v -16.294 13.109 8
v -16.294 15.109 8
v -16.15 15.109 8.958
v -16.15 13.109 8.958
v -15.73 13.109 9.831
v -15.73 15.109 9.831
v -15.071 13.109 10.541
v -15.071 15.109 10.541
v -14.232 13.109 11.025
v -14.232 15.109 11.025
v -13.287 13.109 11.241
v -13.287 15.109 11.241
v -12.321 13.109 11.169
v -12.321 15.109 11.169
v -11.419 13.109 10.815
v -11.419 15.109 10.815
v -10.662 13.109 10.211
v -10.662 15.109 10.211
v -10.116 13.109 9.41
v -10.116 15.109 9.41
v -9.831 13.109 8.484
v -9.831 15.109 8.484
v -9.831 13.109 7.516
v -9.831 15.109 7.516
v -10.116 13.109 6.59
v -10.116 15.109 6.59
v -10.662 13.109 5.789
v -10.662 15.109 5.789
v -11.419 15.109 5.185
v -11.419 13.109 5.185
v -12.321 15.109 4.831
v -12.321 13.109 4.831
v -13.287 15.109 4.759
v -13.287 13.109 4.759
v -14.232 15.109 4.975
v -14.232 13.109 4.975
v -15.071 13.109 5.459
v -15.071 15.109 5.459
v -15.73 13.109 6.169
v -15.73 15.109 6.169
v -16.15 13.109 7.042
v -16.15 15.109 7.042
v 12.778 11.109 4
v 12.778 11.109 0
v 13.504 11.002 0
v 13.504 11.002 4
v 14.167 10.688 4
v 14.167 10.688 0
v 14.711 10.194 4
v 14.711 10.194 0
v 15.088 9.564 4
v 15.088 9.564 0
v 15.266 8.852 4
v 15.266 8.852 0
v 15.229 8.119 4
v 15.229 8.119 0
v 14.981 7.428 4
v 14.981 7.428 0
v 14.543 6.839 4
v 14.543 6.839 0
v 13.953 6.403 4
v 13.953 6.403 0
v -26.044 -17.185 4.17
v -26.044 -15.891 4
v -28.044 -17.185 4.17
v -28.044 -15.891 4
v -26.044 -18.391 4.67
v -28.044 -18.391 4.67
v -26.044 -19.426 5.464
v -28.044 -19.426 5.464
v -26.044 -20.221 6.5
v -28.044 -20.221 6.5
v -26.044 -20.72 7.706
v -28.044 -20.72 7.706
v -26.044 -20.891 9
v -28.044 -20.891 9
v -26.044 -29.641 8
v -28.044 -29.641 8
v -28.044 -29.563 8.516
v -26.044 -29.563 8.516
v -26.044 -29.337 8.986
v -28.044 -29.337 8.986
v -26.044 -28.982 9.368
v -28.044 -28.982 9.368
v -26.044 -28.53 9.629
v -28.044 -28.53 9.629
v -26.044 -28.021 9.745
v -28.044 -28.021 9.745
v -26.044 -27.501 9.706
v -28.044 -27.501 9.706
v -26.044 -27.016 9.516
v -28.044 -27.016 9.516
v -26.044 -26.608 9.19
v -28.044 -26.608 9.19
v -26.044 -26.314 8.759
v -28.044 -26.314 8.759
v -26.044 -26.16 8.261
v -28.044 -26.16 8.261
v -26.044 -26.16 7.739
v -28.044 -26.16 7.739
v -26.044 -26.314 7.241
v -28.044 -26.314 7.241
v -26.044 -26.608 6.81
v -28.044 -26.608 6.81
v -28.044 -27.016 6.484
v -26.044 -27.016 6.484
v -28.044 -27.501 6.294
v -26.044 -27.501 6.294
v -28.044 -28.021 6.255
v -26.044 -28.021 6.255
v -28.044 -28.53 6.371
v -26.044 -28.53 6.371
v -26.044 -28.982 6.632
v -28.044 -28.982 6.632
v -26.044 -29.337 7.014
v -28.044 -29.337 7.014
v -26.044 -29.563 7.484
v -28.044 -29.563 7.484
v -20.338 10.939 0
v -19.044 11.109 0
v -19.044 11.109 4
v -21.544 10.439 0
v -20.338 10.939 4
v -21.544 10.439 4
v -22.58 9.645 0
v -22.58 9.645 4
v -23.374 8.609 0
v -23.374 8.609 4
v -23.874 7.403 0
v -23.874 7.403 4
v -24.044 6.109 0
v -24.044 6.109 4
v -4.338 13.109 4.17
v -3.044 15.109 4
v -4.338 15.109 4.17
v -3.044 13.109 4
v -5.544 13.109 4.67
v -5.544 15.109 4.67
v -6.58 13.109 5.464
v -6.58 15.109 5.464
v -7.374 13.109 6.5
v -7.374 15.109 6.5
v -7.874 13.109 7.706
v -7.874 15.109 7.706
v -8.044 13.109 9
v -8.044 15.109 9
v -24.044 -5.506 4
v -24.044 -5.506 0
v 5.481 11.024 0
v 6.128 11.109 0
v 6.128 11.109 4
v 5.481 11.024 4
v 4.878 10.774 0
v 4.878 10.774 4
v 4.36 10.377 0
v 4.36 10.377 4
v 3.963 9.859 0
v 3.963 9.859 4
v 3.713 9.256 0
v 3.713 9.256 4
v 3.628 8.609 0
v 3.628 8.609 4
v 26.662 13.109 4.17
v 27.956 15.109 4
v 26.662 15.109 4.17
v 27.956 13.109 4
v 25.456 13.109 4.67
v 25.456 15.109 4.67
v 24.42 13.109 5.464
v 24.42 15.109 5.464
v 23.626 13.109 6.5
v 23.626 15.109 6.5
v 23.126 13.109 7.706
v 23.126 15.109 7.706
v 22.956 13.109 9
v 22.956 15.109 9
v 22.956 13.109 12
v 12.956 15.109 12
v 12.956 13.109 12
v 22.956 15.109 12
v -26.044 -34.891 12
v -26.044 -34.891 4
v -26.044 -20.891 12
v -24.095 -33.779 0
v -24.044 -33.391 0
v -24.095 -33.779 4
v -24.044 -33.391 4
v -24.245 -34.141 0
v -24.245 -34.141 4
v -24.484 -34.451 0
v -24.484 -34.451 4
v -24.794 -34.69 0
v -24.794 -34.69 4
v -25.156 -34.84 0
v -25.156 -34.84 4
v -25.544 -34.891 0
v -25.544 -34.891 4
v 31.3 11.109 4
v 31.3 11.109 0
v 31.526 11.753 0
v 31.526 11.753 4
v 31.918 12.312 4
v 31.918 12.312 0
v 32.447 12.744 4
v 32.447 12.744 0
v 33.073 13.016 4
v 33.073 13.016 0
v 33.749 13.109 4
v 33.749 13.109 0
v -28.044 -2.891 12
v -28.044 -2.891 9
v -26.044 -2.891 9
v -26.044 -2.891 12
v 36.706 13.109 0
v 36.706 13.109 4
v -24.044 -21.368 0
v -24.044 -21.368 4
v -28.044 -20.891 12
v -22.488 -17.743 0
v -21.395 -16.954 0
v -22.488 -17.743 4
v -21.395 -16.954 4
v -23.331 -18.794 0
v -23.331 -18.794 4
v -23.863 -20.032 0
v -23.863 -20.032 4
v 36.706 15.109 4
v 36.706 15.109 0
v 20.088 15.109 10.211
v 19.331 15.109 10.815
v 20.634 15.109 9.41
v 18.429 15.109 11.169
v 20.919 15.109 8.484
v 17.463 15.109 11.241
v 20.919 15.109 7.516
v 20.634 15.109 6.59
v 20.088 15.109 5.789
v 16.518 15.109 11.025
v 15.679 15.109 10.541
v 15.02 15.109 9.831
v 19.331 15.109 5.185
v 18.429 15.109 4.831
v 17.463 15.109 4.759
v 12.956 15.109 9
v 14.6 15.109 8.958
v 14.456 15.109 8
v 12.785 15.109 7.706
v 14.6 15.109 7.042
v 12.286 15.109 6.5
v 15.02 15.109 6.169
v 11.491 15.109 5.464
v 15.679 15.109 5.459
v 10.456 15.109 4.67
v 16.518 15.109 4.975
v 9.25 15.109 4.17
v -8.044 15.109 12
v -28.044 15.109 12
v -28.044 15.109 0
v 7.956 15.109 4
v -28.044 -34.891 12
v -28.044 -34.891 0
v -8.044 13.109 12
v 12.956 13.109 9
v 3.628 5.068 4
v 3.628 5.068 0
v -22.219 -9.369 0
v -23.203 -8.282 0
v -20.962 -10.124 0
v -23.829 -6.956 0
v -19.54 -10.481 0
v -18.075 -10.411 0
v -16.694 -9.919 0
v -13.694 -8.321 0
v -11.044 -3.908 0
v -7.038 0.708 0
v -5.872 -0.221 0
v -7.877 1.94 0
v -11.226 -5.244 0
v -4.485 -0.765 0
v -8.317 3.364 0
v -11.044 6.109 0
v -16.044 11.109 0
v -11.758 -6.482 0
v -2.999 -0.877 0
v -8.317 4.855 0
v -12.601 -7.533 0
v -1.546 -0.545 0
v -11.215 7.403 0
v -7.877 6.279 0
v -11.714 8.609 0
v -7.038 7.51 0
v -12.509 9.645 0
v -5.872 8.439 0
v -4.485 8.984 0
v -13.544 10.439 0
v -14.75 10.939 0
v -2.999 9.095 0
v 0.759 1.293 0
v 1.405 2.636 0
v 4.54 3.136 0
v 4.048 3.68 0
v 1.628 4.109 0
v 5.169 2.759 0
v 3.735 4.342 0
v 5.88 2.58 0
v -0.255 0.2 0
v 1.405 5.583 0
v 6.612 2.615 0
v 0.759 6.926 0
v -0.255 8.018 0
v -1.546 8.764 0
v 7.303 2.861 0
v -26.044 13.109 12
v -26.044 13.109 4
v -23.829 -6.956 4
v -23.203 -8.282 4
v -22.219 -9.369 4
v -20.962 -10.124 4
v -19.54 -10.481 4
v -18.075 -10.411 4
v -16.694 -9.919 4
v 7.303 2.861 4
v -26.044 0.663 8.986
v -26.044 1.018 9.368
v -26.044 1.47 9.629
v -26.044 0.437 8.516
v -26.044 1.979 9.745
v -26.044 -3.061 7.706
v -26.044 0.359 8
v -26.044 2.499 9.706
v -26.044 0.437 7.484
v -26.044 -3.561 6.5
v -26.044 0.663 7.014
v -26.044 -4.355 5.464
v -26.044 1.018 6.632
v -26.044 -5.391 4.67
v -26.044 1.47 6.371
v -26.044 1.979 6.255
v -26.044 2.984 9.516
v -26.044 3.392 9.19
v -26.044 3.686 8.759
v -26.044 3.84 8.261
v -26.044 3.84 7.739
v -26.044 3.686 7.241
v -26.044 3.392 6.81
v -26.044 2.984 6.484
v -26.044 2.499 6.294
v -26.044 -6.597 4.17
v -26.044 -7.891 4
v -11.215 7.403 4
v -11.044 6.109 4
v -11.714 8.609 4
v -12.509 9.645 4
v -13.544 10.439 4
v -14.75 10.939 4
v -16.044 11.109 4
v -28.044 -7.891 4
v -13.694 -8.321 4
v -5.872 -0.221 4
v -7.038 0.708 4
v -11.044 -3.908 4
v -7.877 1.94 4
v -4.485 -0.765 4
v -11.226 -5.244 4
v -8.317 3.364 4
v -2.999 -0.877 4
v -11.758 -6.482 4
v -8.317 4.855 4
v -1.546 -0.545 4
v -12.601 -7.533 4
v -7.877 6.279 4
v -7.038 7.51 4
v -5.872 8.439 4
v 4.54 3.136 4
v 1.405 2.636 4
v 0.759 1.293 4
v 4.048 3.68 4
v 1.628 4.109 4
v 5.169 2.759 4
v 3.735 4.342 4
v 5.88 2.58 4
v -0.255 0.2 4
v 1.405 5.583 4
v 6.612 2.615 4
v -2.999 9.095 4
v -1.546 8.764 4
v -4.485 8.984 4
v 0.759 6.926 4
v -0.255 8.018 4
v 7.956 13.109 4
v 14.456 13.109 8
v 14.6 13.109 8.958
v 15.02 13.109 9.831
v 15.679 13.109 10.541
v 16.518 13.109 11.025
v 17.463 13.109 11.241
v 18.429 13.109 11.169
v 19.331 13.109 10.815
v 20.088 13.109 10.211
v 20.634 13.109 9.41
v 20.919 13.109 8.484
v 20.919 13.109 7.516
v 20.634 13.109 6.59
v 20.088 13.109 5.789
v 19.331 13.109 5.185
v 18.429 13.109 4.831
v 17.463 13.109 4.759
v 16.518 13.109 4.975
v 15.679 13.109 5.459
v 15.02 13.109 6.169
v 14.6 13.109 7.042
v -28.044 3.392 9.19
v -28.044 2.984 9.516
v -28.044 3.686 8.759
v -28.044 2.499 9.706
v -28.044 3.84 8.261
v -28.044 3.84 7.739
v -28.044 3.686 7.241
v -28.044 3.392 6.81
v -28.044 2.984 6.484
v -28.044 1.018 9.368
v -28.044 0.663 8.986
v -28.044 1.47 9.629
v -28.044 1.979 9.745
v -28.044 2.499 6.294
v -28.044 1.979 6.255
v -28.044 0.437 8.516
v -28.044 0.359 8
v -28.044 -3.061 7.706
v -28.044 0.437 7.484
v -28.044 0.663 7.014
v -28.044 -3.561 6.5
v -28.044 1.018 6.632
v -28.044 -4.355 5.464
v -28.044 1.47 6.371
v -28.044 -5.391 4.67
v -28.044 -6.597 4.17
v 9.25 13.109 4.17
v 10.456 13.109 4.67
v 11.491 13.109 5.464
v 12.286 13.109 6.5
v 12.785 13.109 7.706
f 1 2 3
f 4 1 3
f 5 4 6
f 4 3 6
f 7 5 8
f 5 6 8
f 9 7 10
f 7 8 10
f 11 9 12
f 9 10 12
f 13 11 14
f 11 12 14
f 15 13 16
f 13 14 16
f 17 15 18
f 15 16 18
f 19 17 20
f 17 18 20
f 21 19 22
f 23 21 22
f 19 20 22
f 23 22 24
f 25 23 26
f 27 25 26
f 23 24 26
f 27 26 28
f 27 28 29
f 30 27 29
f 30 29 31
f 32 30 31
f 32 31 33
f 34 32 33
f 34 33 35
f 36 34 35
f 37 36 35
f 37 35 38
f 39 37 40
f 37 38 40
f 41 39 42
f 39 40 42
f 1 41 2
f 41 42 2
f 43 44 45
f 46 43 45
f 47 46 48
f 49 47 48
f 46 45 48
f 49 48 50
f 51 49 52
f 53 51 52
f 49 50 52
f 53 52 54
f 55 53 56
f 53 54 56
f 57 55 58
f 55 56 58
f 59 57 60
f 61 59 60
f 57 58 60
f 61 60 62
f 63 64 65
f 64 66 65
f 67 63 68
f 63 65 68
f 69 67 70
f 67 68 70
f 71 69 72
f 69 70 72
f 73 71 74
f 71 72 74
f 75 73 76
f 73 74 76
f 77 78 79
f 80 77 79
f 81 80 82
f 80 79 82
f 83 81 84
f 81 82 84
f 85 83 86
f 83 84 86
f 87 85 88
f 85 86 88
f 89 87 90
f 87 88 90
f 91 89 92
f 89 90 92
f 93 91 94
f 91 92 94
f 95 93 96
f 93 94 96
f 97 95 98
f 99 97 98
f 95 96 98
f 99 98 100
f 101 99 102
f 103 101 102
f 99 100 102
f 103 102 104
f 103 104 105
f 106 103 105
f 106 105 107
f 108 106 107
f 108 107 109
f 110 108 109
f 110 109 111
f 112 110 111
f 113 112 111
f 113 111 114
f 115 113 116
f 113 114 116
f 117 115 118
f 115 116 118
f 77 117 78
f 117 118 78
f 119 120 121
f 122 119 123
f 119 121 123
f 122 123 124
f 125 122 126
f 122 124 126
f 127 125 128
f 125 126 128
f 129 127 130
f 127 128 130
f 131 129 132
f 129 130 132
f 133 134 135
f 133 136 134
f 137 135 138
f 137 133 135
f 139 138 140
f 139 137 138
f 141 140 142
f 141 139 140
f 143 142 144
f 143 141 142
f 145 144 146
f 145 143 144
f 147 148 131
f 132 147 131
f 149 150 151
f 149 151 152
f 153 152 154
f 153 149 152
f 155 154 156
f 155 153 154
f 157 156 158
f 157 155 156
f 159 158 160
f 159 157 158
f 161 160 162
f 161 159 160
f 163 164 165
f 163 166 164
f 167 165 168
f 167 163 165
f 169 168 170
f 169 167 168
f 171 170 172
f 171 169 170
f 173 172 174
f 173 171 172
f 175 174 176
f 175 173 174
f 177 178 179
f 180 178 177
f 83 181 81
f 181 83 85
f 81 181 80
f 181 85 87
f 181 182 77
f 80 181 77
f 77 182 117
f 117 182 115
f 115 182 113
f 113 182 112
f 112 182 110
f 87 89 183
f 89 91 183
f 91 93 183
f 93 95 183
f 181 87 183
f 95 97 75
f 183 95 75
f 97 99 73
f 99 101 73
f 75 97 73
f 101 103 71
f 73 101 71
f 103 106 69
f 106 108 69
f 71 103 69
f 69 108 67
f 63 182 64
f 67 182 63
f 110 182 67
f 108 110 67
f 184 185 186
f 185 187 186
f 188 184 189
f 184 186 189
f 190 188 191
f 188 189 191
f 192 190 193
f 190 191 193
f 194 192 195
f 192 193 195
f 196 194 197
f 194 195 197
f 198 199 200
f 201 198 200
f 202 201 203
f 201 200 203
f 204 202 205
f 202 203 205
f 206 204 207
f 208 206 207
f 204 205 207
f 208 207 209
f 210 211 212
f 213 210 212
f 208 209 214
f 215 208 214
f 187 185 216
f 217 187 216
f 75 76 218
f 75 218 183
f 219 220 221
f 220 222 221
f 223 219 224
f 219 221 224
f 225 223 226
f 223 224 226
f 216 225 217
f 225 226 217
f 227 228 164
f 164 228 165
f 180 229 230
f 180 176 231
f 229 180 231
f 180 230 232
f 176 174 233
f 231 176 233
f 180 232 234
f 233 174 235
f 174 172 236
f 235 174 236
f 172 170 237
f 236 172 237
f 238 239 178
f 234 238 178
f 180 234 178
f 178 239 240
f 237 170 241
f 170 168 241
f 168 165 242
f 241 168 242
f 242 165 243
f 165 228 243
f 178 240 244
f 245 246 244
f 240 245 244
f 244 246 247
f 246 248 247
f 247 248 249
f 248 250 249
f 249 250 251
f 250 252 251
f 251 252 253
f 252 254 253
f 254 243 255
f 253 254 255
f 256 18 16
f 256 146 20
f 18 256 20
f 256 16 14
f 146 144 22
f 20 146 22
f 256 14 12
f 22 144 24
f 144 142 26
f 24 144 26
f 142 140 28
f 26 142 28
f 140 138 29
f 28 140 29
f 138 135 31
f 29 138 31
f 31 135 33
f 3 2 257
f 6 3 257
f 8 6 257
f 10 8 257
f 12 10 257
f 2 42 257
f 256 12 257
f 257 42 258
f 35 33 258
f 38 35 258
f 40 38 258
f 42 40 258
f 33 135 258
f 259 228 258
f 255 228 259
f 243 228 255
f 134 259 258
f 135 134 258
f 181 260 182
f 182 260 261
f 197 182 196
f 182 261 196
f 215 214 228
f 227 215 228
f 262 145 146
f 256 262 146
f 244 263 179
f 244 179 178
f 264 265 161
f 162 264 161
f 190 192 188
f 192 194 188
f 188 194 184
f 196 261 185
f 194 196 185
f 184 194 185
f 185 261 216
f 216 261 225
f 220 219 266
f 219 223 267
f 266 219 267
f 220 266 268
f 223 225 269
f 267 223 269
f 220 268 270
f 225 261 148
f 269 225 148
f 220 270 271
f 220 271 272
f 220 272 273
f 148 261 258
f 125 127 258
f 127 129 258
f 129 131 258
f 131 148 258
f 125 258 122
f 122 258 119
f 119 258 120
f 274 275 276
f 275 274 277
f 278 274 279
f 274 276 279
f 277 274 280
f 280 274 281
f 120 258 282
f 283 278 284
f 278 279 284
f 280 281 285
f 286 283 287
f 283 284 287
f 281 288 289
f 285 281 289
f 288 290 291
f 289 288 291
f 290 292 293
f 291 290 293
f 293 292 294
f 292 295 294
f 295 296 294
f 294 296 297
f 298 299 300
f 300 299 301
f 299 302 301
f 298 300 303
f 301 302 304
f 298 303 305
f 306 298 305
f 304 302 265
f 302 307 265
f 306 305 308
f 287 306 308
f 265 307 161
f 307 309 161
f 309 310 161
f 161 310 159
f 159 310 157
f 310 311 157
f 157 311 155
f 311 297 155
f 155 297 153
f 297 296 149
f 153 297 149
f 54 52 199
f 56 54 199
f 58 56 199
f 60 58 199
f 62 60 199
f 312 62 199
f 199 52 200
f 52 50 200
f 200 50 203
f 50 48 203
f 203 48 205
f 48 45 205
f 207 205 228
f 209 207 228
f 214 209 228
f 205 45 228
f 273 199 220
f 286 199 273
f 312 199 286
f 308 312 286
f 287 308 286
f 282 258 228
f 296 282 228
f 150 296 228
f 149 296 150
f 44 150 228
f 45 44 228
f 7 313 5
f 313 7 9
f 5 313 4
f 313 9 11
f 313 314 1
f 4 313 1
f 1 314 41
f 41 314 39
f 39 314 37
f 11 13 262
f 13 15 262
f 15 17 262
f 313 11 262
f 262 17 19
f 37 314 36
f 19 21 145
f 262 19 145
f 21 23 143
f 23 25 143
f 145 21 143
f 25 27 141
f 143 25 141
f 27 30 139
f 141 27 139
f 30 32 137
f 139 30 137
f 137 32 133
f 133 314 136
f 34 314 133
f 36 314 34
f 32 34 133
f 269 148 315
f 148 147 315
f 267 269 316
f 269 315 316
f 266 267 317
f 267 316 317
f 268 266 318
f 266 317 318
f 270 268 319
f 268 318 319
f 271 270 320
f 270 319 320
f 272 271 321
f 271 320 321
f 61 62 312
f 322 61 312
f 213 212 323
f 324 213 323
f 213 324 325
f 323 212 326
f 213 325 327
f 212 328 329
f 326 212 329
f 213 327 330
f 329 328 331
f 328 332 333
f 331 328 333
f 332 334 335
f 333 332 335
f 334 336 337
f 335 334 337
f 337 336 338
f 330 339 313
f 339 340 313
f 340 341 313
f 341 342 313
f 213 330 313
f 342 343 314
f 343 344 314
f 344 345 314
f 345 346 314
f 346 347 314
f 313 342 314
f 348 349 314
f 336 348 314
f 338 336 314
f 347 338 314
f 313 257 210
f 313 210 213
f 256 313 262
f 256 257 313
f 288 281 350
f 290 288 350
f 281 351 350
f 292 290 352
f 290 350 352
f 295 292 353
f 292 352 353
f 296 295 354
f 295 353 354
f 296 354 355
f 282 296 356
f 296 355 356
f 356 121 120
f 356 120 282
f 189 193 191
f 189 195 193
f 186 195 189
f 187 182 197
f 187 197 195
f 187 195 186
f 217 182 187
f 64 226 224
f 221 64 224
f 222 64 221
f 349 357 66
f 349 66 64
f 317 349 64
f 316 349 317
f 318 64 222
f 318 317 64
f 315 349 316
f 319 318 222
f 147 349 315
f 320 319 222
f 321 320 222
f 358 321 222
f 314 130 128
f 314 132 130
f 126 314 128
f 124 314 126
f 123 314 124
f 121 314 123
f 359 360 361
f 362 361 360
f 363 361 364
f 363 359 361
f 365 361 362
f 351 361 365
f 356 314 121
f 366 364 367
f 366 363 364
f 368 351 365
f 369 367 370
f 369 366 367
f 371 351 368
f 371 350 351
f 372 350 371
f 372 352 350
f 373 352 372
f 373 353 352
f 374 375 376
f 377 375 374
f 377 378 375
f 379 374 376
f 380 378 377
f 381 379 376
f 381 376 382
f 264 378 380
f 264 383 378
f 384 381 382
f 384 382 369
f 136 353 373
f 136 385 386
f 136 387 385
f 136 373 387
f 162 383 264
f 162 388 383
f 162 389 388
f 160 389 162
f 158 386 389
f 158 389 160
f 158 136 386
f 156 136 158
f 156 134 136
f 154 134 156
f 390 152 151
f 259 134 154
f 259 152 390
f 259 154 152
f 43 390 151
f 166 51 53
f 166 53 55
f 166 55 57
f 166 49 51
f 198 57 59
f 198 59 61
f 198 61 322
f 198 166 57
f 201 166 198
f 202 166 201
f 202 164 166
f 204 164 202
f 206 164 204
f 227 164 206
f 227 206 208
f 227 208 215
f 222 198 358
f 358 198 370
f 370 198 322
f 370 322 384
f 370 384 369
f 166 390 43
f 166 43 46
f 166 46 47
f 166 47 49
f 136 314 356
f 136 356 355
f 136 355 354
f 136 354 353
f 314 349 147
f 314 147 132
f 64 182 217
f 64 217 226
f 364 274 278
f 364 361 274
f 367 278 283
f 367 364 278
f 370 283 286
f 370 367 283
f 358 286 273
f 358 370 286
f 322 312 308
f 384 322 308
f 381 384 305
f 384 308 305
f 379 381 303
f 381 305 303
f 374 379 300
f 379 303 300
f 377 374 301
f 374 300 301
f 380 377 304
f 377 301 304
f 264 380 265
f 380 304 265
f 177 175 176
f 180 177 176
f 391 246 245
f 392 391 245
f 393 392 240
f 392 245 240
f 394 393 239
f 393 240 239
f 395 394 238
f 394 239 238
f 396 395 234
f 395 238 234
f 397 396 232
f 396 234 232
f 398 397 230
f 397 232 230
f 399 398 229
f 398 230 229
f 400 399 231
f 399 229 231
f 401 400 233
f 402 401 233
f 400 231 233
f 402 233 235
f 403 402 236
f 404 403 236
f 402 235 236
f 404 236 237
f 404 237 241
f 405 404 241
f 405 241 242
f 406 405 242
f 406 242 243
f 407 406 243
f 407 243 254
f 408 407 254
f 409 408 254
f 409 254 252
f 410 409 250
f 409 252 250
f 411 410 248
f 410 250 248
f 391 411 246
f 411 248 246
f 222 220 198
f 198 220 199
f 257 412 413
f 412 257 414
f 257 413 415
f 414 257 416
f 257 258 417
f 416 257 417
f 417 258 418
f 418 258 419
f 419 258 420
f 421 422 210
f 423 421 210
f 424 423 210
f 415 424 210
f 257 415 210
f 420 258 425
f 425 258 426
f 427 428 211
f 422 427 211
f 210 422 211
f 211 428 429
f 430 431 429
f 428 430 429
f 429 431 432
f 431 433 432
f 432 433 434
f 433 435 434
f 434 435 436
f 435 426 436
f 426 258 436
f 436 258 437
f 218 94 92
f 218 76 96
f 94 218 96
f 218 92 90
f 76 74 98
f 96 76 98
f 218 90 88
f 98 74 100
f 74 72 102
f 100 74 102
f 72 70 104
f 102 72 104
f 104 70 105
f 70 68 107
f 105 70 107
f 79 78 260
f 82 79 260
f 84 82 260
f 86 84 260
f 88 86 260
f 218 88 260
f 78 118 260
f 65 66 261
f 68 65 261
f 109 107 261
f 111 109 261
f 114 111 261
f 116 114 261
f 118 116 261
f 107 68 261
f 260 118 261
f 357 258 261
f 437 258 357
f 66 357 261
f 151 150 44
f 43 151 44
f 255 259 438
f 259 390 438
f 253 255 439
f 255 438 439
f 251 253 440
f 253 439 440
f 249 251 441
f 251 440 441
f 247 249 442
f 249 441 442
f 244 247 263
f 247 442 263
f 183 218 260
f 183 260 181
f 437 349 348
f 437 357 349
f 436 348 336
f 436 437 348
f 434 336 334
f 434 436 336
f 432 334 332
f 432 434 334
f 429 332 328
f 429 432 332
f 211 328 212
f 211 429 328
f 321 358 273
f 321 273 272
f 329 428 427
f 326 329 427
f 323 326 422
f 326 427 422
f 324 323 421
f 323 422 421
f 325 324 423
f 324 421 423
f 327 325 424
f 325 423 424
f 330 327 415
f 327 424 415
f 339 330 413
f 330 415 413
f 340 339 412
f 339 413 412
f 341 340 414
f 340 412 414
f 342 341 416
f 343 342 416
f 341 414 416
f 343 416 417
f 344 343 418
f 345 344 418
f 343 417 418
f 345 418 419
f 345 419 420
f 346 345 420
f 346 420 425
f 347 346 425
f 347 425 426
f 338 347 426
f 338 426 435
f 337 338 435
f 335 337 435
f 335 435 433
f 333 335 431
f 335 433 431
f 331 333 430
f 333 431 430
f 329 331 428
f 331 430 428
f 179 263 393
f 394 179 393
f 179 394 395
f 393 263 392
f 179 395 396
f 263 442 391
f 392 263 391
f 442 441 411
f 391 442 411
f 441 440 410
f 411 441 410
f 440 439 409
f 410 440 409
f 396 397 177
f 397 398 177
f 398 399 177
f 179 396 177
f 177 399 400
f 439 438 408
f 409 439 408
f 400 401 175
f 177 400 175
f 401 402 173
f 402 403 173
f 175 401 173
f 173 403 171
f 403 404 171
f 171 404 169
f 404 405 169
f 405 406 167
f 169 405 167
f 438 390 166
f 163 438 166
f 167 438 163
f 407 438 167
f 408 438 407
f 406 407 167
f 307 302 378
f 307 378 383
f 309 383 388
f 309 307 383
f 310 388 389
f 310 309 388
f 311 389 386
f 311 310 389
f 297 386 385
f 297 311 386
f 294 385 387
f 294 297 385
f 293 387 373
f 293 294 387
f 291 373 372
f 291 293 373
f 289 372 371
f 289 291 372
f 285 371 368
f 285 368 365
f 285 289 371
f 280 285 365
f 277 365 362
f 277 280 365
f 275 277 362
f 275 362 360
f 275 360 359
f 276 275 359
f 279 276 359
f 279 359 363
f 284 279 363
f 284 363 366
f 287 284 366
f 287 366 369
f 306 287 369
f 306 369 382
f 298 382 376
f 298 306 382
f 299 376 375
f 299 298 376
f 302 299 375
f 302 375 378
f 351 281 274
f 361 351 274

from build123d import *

# Parameters (mm, degrees)
F0_R        = 5
F1_DEPTH    = 4
F2_W        = 10
F2_H        = 2
F2_W_2      = 18
F2_W_3      = 2
F2_H_2      = 14
F3_DEPTH    = 12
F4_R        = 5
F5_T1_DEPTH = 4
F6_R        = 1.5
F7_R        = 3.25
F9_DEPTH    = 2
F8_R        = 1.75
F10_DEPTH   = 2


# Not quite as in the source:
# - a fillet or chamfer that OpenCascade refuses, or shapes differently, is made with other operations: its cross-section is extruded or revolved along the edge and cut away or added


with BuildPart() as f1:
    # F0 (on Top) → F1 (new body)
    with BuildSketch(Plane.XY):
        Polygon((-24.0443362383, -18.3656413368), (31.299512524, 11.1093264446), (31.299512524, 13.1093264446), (36.7056637617, 13.1093264446), (36.7056637617, 15.1093264446), (-28.0443362383, 15.1093264446), (-28.0443362383, -34.8906735554), (-24.0443362383, -34.8906735554), align=None)
        Polygon((-24.0443362383, -13.8337272738), (-24.0443362383, 11.1093264446), (-11.0443362383, 11.1093264446), (3.6275881428, 11.1093264446), (22.7901370984, 11.1093264446), (3.6275881428, 0.9037566169), (-11.0443362383, -6.9102011778), align=None, mode=Mode.SUBTRACT)
        Polygon((3.6275881428, 11.1093264446), (-11.0443362383, 11.1093264446), (-11.0443362383, -6.9102011778), (3.6275881428, 0.9037566169), align=None)
        with Locations((-3.3724118572, 4.1093264446)):
            Circle(F0_R, mode=Mode.SUBTRACT)
    extrude(amount=F1_DEPTH)

    # F2 (on Top) → F3 (join)
    with BuildSketch(Plane.XY):
        with Locations((17.9556637617, 14.1093264446)):
            Rectangle(F2_W, F2_H)
        with Locations((-17.0443362383, 14.1093264446)):
            Rectangle(F2_W_2, F2_H)
        Polygon((-26.0443362383, 15.1093264446), (-28.0443362383, 15.1093264446), (-28.0443362383, -2.8906735554), (-26.0443362383, -2.8906735554), (-26.0443362383, 13.1093264446), align=None)
        with Locations((-27.0443362383, -27.8906735554)):
            Rectangle(F2_W_3, F2_H_2)
    extrude(amount=F3_DEPTH)

    # F4
    f4_edges = [f1.edges().sort_by_distance(p)[0] for p in [
        (-24.044336, 11.109326, 2),
        (-24.044336, -13.833727, 2),
        (-11.044336, -6.910201, 2),
        (-11.044336, 11.109326, 2),
        (-24.044336, -18.365641, 2),
        (-27.044336, -2.890674, 4),
        (-27.044336, -20.890674, 4),
        (-8.044336, 14.109326, 4),
        (12.955664, 14.109326, 4),
        (22.955664, 14.109326, 4),
    ]]
    fillet(f4_edges, radius=F4_R)

    # F5: fillet of radius 2.5 on 4 edges, made by hand

    # F5_s2 → F5_t1 (join)
    with BuildSketch(Plane.XY):
        with BuildLine():
            ThreePointArc((31.299512524, 11.1093264446), (32.1678634367, 12.5458181177), (33.7490022668, 13.1093264446))
            Line((33.7490022668, 13.1093264446), (31.299512524, 13.1093264446))
            Line((31.299512524, 13.1093264446), (31.299512524, 11.1093264446))
        make_face()
        with BuildLine():
            ThreePointArc((6.1275881428, 11.1093264446), (4.3598211899, 10.3770933976), (3.6275881428, 8.6093264446))
            Line((3.6275881428, 8.6093264446), (3.6275881428, 11.1093264446))
            Line((3.6275881428, 11.1093264446), (6.1275881428, 11.1093264446))
        make_face()
        with BuildLine():
            ThreePointArc((7.302762524, 2.8610770581), (4.840719065, 2.9242958576), (3.6275881428, 5.0676502325))
            Line((3.6275881428, 5.0676502325), (3.6275881428, 0.9037566169))
            Line((3.6275881428, 0.9037566169), (7.302762524, 2.8610770581))
        make_face()
        with BuildLine():
            ThreePointArc((12.7776375713, 11.1093264446), (15.2031718358, 9.2149530062), (13.9528119525, 6.4027532703))
            Line((13.9528119525, 6.4027532703), (22.7901370984, 11.1093264446))
            Line((22.7901370984, 11.1093264446), (12.7776375713, 11.1093264446))
        make_face()
    extrude(amount=F5_T1_DEPTH)

    # F6
    f6_edges = [f1.edges().sort_by_distance(p)[0] for p in [
        (-24.044336, -34.890674, 2),
    ]]
    fillet(f6_edges, radius=F6_R)

    # F7 (on face) → F9 (cut)
    with BuildSketch(Plane(origin=(0, 15.1093264446, 0), x_dir=(-1, 0, 0), z_dir=(0, 1, 0))):
        with Locations((-17.7056637617, 8)):
            Circle(F7_R)
        with Locations((13.0443362383, 8)):
            Circle(F7_R)
    extrude(amount=-F9_DEPTH, mode=Mode.SUBTRACT)

    # F8 (on face) → F10 (cut)
    with BuildSketch(Plane(origin=(-28.0443362383, 0, 0), x_dir=(0, -1, 0), z_dir=(-1, 0, 0))):
        with Locations((-2.1093264446, 8)):
            Circle(F8_R)
        with Locations((27.8906735554, 8)):
            Circle(F8_R)
    extrude(amount=-F10_DEPTH, mode=Mode.SUBTRACT)


solid = f1.part
